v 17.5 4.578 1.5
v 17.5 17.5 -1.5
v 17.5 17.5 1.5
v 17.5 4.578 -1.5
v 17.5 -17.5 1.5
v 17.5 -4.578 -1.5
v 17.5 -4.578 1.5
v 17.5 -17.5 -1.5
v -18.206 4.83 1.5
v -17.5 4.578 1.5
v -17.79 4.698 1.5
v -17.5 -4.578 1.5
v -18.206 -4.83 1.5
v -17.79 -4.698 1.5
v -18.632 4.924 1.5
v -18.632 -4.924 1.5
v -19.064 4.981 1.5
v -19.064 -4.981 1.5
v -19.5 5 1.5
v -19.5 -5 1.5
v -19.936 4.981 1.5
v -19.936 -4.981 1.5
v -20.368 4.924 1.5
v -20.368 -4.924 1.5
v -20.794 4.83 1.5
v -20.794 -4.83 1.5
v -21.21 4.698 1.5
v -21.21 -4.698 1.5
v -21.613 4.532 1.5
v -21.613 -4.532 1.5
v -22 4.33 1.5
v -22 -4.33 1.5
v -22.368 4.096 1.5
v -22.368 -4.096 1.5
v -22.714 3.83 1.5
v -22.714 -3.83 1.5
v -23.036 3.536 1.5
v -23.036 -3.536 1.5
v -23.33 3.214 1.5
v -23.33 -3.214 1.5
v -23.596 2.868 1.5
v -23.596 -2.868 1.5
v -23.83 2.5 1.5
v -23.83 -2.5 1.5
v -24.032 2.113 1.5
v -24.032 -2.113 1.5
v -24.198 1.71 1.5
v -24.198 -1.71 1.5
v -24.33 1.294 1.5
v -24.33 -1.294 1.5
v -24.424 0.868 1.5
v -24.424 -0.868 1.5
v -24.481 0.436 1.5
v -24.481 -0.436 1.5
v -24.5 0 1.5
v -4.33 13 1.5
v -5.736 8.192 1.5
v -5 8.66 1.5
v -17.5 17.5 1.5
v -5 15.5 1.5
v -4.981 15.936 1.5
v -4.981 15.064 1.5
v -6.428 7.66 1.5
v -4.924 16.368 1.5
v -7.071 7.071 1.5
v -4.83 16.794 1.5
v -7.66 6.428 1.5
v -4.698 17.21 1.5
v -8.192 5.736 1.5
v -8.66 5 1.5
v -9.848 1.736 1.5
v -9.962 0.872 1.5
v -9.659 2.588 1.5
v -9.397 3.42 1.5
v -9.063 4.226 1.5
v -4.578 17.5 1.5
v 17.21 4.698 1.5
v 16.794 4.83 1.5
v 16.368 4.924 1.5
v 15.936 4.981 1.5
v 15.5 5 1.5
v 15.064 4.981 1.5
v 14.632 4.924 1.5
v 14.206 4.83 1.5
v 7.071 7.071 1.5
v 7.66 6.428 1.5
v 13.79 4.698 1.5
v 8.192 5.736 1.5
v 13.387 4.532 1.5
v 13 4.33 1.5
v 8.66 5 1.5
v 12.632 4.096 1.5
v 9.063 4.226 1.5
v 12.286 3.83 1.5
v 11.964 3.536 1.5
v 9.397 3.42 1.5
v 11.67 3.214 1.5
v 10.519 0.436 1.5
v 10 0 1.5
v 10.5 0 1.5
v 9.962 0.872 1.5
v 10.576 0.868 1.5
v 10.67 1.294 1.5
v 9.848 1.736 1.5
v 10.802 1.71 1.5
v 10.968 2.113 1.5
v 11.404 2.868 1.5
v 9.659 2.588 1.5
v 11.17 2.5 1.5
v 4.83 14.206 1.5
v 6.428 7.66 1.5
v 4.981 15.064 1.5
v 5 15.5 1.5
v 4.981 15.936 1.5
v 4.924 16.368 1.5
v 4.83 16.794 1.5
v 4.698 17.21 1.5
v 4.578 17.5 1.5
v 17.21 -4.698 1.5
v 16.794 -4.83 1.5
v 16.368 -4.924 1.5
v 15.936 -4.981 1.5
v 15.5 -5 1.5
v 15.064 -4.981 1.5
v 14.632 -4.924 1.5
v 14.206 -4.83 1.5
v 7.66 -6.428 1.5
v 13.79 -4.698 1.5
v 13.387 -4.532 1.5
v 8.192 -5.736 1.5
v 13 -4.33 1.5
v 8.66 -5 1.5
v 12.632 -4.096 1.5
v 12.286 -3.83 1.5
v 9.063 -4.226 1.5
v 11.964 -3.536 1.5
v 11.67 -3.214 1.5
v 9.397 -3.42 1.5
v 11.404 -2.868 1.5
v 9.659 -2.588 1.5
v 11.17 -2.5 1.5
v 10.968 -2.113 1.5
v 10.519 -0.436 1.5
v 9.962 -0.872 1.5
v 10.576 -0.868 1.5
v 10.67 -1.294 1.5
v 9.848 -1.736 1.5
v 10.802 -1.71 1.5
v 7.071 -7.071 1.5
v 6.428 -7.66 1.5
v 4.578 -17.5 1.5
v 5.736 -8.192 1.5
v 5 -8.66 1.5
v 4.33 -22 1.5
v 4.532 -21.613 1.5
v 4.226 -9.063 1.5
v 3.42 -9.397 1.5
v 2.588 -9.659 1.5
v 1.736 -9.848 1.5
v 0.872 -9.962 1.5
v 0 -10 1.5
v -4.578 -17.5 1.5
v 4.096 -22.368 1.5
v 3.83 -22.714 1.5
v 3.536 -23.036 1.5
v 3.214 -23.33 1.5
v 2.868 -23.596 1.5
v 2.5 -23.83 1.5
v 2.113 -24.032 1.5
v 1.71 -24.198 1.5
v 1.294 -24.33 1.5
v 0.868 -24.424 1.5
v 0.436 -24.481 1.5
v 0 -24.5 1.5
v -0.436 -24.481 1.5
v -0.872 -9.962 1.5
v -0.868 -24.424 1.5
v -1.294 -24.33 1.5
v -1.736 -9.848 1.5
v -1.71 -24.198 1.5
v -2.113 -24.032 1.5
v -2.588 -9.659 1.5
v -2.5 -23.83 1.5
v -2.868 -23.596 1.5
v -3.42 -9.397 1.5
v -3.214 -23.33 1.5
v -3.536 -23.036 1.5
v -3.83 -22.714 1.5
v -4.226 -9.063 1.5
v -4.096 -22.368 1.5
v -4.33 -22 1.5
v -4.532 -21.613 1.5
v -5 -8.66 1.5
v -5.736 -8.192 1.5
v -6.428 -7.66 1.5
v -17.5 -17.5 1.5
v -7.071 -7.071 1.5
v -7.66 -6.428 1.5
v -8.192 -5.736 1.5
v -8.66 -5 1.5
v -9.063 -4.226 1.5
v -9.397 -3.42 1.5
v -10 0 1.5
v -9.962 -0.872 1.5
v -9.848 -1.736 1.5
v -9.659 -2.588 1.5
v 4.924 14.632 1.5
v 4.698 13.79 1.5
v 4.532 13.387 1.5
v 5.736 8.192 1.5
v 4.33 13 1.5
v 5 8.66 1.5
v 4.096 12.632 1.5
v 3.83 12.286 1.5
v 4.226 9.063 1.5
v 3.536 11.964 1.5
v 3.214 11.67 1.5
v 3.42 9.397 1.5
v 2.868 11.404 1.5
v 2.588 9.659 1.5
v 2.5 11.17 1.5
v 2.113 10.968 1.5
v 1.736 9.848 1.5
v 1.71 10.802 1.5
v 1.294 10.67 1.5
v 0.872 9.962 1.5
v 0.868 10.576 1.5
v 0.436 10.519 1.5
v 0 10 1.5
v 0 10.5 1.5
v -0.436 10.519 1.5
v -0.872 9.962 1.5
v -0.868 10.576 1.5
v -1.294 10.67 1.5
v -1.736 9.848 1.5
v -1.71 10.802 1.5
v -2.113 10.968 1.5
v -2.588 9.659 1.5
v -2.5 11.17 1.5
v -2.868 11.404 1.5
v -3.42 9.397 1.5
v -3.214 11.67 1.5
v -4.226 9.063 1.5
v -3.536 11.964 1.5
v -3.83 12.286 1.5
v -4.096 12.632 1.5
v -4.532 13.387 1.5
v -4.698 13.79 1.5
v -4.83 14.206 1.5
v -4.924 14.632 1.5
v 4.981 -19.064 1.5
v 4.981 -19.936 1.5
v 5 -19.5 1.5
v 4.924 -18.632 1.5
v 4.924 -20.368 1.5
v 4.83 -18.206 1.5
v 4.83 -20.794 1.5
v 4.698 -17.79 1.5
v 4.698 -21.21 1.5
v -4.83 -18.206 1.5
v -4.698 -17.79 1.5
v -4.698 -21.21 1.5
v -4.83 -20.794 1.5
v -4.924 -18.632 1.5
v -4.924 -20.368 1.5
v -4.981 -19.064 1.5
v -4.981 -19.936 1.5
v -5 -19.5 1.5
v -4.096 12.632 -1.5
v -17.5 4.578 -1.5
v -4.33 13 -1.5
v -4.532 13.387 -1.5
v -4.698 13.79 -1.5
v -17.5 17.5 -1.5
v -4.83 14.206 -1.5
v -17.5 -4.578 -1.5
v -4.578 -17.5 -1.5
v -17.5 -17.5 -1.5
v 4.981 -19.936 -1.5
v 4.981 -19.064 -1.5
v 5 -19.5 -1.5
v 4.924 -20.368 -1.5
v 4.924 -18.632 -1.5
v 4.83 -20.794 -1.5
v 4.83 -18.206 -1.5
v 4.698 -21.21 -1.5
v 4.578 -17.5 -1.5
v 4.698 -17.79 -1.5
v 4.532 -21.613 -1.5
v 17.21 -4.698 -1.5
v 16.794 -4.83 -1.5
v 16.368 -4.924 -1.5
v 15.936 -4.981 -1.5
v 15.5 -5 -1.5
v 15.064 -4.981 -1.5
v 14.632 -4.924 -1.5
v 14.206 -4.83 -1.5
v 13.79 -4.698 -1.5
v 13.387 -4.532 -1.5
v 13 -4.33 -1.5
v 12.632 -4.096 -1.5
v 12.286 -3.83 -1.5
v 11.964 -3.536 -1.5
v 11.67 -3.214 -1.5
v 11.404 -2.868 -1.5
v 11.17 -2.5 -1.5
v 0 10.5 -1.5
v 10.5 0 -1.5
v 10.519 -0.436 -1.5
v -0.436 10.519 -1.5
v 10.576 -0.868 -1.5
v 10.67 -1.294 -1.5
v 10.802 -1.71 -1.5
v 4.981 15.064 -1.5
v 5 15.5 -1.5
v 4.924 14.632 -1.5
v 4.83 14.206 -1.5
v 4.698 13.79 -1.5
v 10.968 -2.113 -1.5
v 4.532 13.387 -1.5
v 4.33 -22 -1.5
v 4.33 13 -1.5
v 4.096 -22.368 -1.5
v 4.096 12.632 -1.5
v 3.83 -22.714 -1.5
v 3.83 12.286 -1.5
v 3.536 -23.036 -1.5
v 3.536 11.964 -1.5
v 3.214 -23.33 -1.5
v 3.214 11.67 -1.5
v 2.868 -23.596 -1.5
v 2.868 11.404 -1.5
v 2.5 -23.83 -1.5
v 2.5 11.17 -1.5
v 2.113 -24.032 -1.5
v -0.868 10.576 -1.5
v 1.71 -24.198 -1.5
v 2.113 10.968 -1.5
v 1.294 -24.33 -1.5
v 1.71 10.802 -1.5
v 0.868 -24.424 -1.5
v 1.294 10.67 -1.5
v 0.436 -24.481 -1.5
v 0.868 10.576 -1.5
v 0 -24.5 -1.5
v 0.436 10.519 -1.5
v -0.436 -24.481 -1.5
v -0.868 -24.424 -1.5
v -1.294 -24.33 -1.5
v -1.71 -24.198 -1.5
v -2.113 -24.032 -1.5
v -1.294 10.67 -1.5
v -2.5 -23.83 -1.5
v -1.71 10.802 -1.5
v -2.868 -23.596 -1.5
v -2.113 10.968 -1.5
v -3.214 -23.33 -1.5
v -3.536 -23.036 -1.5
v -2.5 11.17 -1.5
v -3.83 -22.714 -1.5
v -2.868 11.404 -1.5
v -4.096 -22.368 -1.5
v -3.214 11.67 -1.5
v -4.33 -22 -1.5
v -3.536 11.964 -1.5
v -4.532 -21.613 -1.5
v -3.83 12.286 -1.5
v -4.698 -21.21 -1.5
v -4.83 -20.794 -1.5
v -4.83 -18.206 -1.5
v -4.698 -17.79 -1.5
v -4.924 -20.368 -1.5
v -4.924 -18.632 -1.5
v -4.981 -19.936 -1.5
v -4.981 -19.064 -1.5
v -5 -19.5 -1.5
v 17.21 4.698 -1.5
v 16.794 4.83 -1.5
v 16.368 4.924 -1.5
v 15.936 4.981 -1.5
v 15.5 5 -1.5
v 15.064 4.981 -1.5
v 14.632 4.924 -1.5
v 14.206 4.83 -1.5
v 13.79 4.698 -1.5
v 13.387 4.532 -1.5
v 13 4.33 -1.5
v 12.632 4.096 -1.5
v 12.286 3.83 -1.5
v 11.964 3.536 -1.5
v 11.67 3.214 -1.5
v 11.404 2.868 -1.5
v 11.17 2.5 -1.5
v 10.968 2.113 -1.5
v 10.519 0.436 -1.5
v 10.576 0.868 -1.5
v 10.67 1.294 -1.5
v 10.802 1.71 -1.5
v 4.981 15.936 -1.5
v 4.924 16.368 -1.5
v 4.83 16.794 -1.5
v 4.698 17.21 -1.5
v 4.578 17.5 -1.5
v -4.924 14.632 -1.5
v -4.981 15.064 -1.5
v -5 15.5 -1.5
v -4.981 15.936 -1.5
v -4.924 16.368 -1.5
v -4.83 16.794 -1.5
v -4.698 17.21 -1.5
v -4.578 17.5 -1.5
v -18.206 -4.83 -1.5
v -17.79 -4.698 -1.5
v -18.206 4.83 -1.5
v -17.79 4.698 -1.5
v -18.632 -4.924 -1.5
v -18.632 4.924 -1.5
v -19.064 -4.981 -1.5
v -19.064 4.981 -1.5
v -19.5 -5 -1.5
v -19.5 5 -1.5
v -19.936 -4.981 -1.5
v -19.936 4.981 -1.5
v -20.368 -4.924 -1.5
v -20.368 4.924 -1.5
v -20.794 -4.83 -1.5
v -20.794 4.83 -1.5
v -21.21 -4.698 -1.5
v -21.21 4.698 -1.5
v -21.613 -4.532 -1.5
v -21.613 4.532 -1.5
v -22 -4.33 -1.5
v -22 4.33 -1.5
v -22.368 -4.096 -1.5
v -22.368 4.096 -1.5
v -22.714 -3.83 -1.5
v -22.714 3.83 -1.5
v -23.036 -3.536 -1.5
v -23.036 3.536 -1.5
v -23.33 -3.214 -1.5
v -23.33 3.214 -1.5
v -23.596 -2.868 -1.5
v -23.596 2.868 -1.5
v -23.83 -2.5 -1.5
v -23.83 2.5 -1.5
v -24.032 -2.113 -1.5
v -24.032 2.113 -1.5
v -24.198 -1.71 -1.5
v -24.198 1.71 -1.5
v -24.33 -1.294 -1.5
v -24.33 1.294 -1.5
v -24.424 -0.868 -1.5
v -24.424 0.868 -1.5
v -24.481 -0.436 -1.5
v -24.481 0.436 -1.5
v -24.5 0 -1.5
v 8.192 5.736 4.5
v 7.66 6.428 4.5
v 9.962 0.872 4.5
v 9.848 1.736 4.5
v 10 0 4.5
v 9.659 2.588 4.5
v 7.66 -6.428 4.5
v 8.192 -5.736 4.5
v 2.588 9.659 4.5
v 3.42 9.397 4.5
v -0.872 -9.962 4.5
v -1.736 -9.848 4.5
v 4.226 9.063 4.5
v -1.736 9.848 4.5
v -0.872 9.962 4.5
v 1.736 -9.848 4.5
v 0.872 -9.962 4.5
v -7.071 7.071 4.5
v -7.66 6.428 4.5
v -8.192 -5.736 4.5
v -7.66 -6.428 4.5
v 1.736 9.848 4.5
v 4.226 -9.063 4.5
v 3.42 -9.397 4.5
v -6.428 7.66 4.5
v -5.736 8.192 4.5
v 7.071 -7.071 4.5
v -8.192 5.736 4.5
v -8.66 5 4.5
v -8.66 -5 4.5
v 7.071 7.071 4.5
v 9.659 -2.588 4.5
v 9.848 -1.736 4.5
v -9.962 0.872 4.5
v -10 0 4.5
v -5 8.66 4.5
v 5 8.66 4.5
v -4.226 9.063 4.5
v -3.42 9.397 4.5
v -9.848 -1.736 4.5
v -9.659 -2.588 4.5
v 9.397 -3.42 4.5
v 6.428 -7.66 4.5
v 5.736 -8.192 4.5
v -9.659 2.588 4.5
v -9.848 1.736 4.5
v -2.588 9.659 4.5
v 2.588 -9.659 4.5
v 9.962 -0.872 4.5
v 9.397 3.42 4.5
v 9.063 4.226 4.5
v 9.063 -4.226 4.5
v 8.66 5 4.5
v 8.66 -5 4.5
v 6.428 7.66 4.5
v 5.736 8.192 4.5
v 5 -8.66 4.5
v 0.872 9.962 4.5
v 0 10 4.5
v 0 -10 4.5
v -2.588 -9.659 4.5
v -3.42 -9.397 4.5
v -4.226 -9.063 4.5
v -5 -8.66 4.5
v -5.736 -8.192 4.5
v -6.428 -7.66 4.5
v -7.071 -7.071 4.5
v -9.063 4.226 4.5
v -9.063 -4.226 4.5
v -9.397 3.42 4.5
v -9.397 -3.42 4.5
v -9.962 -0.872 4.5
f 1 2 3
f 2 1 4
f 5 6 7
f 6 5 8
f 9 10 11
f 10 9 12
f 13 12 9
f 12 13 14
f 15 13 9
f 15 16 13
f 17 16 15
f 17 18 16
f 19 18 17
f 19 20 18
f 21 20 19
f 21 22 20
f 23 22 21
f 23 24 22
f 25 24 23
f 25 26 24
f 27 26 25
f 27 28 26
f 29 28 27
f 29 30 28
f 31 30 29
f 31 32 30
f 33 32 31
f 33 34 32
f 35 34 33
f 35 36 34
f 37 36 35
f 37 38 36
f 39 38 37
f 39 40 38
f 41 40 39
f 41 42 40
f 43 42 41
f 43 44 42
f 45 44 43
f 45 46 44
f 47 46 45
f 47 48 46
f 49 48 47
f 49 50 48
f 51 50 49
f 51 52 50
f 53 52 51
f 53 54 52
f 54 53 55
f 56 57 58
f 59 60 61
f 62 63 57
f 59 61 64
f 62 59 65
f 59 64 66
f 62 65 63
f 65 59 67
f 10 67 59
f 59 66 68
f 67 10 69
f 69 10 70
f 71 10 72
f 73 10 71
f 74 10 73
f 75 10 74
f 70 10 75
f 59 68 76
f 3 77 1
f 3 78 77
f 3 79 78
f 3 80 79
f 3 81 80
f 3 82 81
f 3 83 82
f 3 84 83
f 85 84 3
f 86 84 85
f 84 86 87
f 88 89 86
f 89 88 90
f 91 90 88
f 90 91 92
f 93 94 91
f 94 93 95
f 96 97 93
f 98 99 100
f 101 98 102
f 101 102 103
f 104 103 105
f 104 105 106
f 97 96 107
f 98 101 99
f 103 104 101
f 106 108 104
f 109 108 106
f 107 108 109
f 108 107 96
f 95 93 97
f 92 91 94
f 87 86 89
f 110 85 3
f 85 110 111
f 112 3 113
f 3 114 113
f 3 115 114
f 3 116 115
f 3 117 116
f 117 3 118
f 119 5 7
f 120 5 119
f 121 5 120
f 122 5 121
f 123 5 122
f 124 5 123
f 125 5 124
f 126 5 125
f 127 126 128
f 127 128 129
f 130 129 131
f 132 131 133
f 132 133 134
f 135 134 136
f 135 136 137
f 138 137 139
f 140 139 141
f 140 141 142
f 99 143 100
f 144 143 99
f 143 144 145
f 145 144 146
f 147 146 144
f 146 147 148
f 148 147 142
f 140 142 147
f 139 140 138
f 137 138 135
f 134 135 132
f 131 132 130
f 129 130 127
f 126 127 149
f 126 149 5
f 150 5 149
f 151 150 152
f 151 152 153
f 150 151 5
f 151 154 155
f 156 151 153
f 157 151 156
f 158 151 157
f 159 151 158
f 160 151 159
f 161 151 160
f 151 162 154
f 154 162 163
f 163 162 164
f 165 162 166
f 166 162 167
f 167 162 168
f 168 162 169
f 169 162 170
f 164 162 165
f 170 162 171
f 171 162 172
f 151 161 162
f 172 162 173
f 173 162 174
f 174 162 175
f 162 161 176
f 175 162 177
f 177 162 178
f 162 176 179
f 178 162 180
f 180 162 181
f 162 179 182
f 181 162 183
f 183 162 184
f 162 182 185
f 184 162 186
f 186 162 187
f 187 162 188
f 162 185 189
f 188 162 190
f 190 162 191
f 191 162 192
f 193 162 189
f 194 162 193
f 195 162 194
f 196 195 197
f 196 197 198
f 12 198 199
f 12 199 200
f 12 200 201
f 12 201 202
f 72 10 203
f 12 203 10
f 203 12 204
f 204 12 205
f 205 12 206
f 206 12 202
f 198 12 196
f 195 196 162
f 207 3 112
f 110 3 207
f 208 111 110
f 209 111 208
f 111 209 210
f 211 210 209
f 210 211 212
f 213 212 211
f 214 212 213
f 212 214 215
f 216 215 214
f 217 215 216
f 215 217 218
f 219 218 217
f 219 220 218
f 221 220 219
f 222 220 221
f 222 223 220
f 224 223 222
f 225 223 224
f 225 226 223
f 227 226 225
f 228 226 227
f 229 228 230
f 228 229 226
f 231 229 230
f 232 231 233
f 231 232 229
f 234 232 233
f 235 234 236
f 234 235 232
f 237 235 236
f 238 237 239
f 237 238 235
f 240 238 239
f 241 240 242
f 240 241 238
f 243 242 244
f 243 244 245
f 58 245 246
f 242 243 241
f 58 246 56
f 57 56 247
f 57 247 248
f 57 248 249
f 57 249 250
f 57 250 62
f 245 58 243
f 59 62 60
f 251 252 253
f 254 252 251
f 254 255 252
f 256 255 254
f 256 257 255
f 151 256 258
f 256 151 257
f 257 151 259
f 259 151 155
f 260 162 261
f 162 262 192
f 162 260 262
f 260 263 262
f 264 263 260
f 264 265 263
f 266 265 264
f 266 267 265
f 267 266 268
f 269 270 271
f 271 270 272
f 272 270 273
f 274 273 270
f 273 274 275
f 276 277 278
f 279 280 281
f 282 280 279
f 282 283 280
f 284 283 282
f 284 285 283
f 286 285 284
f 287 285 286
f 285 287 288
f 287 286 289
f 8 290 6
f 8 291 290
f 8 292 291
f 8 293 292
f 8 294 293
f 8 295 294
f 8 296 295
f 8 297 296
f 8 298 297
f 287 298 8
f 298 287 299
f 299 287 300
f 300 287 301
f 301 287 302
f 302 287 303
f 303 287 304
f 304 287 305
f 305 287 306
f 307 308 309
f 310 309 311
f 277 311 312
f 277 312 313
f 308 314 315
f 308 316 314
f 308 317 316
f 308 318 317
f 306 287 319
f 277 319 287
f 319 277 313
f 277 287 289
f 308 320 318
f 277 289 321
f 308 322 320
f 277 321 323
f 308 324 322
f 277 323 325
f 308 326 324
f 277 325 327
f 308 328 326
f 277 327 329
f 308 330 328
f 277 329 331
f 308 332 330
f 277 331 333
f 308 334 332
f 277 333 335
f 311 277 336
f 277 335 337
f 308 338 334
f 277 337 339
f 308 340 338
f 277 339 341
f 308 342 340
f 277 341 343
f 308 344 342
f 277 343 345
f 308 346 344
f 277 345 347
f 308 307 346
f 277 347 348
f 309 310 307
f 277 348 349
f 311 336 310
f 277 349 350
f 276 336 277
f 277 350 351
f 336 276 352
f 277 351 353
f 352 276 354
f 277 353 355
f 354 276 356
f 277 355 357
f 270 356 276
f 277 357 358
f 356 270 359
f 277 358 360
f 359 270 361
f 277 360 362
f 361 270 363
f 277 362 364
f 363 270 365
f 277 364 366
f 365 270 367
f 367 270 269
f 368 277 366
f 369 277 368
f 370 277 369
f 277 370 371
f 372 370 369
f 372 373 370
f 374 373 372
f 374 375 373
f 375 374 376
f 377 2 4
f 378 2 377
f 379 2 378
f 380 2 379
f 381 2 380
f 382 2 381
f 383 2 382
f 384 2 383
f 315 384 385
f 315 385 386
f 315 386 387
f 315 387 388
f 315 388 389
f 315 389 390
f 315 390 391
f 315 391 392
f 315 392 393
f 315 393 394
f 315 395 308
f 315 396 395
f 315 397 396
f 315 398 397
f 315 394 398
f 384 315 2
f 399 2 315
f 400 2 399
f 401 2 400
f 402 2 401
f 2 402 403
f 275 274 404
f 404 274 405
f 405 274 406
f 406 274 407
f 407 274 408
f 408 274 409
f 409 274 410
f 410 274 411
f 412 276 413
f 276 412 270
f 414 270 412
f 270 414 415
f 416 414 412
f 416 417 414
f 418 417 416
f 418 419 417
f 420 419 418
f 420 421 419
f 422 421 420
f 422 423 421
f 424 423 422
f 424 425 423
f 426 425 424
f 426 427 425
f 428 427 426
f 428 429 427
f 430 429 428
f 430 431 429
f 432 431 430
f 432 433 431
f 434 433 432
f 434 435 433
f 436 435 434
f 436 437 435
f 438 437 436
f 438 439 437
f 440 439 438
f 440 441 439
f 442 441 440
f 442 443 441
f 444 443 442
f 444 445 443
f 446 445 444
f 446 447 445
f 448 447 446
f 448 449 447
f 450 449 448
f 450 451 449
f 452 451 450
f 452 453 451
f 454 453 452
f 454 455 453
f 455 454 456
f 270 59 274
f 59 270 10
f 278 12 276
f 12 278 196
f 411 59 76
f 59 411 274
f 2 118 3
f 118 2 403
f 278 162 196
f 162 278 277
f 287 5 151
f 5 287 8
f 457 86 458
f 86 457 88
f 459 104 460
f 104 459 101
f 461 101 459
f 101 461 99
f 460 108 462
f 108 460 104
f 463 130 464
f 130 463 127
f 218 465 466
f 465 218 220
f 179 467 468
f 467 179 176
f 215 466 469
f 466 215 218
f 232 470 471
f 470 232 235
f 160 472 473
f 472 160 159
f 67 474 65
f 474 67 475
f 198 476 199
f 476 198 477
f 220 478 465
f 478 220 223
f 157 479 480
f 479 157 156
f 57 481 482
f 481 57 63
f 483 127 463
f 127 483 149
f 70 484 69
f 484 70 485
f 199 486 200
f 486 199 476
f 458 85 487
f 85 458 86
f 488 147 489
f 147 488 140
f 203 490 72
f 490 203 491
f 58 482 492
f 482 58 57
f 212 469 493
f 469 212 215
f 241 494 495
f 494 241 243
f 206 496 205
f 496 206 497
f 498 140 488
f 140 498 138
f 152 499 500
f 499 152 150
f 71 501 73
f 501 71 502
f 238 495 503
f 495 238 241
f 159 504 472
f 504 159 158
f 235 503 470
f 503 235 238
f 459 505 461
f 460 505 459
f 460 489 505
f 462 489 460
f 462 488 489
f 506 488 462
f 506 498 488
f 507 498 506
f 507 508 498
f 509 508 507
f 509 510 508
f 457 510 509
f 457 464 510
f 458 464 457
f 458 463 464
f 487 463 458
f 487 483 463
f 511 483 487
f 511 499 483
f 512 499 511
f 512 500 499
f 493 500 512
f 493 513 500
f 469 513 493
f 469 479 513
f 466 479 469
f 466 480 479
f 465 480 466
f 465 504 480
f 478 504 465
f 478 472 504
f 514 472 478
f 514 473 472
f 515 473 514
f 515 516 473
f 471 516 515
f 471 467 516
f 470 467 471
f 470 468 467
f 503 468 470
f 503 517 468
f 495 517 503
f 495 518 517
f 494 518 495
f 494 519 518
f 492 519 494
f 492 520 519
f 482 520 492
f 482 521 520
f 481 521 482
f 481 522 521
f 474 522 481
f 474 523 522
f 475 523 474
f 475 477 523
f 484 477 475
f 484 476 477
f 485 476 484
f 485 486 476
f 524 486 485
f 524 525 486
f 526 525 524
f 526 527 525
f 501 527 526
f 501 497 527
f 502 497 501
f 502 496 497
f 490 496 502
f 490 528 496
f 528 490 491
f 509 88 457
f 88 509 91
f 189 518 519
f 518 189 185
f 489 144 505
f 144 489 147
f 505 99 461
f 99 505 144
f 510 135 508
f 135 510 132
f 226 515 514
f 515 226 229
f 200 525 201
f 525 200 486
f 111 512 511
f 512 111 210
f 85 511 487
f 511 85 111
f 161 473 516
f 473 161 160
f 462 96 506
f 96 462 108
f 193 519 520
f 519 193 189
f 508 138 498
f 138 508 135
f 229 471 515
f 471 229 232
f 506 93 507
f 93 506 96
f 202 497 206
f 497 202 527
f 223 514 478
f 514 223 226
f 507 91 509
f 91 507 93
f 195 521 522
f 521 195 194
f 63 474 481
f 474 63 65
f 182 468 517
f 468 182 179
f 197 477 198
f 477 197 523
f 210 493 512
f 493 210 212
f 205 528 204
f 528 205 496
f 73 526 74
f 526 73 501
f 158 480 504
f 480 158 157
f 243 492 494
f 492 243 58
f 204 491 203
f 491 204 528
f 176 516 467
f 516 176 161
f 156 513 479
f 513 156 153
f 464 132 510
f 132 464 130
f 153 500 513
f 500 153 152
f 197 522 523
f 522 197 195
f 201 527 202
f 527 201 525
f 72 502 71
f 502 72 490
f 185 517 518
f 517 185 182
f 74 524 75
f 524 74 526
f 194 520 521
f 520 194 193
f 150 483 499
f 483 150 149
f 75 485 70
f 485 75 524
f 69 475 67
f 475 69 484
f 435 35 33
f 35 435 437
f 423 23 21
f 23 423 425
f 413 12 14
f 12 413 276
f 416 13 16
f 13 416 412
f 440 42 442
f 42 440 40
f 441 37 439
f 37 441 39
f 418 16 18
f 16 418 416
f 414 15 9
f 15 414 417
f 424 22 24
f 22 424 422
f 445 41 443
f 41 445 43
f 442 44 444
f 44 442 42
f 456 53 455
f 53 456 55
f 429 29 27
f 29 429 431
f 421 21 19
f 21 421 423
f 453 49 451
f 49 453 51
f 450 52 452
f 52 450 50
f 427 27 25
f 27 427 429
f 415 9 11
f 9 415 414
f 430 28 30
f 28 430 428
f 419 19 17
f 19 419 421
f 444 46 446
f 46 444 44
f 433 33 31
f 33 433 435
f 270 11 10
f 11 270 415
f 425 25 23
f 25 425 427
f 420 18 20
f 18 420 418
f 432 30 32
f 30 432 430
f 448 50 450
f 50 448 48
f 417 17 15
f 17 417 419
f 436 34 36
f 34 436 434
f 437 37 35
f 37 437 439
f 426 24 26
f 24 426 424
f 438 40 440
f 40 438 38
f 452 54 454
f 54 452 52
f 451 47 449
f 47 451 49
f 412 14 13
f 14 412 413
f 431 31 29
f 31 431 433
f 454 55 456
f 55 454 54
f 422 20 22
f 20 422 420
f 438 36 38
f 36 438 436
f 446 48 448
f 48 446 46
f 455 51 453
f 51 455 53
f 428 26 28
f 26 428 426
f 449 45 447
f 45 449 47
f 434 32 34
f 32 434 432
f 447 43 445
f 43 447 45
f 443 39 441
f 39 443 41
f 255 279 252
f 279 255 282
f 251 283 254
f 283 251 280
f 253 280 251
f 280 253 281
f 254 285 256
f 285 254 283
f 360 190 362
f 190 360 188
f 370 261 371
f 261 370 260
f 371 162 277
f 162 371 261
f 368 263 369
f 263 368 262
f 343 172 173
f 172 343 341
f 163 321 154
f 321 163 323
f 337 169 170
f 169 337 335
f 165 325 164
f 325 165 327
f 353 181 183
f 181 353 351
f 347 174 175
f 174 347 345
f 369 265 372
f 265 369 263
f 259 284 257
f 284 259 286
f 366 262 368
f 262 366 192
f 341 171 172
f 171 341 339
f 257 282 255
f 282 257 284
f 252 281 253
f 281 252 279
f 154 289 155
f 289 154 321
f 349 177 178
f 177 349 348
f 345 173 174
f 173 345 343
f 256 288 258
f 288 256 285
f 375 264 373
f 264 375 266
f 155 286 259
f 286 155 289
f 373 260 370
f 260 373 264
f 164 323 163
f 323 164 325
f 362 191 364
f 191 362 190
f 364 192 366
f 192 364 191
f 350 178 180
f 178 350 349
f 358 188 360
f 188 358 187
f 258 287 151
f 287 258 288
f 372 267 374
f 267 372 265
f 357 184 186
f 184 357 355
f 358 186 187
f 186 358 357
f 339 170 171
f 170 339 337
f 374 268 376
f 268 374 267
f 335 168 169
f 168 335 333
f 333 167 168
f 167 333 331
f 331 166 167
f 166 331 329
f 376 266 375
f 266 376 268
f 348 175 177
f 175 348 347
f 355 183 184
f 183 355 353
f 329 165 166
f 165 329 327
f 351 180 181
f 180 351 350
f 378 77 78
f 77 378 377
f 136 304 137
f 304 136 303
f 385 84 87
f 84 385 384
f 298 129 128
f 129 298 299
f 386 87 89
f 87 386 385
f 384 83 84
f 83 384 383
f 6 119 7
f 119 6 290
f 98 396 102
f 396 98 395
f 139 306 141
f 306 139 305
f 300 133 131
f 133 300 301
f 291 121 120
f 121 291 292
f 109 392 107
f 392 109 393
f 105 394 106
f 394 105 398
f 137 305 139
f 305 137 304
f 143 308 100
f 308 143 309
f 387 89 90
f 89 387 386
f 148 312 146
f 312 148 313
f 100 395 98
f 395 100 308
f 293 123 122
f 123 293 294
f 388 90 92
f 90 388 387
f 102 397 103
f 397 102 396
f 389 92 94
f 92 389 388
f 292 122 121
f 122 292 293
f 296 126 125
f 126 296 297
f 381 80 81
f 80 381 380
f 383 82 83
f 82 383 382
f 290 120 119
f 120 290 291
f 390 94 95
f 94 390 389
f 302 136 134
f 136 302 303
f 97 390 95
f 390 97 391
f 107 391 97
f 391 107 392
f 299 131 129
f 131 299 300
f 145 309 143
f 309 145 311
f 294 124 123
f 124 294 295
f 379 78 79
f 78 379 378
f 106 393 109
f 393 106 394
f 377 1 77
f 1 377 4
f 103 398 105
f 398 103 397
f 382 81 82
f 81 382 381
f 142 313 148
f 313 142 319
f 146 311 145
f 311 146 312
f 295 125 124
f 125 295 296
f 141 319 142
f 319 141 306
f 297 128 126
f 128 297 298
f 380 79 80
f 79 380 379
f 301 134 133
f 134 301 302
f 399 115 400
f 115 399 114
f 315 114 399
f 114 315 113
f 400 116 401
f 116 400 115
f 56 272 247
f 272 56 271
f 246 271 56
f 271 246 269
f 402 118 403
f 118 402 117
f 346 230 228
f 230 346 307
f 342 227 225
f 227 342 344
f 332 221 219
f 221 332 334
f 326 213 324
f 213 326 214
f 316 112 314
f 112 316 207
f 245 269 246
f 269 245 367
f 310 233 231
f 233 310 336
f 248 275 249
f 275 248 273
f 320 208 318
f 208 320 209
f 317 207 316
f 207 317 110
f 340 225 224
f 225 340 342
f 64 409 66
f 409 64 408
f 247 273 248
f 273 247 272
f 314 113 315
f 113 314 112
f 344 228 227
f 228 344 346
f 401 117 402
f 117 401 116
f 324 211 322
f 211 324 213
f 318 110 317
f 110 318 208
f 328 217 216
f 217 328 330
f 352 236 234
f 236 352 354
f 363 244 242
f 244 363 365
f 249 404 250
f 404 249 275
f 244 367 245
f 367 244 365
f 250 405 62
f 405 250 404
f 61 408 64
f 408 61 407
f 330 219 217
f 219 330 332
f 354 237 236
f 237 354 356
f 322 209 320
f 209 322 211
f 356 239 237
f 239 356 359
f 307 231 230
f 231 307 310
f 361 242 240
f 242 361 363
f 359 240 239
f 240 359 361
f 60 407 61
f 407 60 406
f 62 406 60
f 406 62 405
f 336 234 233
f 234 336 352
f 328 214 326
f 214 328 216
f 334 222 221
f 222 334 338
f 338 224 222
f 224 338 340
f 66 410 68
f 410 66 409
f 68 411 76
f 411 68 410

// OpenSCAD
// file: base.scad
//$fa=5; $fs=0.1;

// стыкабельное основание
module base(){
	difference(){
		union(){
			cube([35,35,3], center=true);	 // база
			translate([0, 0, 3]) cylinder(h=3, r=10, center=true);
			translate([-19.5, 0, 0]) cylinder(h=3, r=5, center=true); // выступы
			translate([0, -19.5, 0]) cylinder(h=3, r=5, center=true);
		}

		union(){
			translate([15.5, 0, 0]) cylinder(h=3.2, r=5, center=true); // прорези
			translate([0, 15.5, 0]) cylinder(h=3.2, r=5, center=true);
		}
	}
}

base();
// main file
$fa=5; $fs=0.1;

use<base.scad>;

module spacer(){
	base();
}

spacer();
